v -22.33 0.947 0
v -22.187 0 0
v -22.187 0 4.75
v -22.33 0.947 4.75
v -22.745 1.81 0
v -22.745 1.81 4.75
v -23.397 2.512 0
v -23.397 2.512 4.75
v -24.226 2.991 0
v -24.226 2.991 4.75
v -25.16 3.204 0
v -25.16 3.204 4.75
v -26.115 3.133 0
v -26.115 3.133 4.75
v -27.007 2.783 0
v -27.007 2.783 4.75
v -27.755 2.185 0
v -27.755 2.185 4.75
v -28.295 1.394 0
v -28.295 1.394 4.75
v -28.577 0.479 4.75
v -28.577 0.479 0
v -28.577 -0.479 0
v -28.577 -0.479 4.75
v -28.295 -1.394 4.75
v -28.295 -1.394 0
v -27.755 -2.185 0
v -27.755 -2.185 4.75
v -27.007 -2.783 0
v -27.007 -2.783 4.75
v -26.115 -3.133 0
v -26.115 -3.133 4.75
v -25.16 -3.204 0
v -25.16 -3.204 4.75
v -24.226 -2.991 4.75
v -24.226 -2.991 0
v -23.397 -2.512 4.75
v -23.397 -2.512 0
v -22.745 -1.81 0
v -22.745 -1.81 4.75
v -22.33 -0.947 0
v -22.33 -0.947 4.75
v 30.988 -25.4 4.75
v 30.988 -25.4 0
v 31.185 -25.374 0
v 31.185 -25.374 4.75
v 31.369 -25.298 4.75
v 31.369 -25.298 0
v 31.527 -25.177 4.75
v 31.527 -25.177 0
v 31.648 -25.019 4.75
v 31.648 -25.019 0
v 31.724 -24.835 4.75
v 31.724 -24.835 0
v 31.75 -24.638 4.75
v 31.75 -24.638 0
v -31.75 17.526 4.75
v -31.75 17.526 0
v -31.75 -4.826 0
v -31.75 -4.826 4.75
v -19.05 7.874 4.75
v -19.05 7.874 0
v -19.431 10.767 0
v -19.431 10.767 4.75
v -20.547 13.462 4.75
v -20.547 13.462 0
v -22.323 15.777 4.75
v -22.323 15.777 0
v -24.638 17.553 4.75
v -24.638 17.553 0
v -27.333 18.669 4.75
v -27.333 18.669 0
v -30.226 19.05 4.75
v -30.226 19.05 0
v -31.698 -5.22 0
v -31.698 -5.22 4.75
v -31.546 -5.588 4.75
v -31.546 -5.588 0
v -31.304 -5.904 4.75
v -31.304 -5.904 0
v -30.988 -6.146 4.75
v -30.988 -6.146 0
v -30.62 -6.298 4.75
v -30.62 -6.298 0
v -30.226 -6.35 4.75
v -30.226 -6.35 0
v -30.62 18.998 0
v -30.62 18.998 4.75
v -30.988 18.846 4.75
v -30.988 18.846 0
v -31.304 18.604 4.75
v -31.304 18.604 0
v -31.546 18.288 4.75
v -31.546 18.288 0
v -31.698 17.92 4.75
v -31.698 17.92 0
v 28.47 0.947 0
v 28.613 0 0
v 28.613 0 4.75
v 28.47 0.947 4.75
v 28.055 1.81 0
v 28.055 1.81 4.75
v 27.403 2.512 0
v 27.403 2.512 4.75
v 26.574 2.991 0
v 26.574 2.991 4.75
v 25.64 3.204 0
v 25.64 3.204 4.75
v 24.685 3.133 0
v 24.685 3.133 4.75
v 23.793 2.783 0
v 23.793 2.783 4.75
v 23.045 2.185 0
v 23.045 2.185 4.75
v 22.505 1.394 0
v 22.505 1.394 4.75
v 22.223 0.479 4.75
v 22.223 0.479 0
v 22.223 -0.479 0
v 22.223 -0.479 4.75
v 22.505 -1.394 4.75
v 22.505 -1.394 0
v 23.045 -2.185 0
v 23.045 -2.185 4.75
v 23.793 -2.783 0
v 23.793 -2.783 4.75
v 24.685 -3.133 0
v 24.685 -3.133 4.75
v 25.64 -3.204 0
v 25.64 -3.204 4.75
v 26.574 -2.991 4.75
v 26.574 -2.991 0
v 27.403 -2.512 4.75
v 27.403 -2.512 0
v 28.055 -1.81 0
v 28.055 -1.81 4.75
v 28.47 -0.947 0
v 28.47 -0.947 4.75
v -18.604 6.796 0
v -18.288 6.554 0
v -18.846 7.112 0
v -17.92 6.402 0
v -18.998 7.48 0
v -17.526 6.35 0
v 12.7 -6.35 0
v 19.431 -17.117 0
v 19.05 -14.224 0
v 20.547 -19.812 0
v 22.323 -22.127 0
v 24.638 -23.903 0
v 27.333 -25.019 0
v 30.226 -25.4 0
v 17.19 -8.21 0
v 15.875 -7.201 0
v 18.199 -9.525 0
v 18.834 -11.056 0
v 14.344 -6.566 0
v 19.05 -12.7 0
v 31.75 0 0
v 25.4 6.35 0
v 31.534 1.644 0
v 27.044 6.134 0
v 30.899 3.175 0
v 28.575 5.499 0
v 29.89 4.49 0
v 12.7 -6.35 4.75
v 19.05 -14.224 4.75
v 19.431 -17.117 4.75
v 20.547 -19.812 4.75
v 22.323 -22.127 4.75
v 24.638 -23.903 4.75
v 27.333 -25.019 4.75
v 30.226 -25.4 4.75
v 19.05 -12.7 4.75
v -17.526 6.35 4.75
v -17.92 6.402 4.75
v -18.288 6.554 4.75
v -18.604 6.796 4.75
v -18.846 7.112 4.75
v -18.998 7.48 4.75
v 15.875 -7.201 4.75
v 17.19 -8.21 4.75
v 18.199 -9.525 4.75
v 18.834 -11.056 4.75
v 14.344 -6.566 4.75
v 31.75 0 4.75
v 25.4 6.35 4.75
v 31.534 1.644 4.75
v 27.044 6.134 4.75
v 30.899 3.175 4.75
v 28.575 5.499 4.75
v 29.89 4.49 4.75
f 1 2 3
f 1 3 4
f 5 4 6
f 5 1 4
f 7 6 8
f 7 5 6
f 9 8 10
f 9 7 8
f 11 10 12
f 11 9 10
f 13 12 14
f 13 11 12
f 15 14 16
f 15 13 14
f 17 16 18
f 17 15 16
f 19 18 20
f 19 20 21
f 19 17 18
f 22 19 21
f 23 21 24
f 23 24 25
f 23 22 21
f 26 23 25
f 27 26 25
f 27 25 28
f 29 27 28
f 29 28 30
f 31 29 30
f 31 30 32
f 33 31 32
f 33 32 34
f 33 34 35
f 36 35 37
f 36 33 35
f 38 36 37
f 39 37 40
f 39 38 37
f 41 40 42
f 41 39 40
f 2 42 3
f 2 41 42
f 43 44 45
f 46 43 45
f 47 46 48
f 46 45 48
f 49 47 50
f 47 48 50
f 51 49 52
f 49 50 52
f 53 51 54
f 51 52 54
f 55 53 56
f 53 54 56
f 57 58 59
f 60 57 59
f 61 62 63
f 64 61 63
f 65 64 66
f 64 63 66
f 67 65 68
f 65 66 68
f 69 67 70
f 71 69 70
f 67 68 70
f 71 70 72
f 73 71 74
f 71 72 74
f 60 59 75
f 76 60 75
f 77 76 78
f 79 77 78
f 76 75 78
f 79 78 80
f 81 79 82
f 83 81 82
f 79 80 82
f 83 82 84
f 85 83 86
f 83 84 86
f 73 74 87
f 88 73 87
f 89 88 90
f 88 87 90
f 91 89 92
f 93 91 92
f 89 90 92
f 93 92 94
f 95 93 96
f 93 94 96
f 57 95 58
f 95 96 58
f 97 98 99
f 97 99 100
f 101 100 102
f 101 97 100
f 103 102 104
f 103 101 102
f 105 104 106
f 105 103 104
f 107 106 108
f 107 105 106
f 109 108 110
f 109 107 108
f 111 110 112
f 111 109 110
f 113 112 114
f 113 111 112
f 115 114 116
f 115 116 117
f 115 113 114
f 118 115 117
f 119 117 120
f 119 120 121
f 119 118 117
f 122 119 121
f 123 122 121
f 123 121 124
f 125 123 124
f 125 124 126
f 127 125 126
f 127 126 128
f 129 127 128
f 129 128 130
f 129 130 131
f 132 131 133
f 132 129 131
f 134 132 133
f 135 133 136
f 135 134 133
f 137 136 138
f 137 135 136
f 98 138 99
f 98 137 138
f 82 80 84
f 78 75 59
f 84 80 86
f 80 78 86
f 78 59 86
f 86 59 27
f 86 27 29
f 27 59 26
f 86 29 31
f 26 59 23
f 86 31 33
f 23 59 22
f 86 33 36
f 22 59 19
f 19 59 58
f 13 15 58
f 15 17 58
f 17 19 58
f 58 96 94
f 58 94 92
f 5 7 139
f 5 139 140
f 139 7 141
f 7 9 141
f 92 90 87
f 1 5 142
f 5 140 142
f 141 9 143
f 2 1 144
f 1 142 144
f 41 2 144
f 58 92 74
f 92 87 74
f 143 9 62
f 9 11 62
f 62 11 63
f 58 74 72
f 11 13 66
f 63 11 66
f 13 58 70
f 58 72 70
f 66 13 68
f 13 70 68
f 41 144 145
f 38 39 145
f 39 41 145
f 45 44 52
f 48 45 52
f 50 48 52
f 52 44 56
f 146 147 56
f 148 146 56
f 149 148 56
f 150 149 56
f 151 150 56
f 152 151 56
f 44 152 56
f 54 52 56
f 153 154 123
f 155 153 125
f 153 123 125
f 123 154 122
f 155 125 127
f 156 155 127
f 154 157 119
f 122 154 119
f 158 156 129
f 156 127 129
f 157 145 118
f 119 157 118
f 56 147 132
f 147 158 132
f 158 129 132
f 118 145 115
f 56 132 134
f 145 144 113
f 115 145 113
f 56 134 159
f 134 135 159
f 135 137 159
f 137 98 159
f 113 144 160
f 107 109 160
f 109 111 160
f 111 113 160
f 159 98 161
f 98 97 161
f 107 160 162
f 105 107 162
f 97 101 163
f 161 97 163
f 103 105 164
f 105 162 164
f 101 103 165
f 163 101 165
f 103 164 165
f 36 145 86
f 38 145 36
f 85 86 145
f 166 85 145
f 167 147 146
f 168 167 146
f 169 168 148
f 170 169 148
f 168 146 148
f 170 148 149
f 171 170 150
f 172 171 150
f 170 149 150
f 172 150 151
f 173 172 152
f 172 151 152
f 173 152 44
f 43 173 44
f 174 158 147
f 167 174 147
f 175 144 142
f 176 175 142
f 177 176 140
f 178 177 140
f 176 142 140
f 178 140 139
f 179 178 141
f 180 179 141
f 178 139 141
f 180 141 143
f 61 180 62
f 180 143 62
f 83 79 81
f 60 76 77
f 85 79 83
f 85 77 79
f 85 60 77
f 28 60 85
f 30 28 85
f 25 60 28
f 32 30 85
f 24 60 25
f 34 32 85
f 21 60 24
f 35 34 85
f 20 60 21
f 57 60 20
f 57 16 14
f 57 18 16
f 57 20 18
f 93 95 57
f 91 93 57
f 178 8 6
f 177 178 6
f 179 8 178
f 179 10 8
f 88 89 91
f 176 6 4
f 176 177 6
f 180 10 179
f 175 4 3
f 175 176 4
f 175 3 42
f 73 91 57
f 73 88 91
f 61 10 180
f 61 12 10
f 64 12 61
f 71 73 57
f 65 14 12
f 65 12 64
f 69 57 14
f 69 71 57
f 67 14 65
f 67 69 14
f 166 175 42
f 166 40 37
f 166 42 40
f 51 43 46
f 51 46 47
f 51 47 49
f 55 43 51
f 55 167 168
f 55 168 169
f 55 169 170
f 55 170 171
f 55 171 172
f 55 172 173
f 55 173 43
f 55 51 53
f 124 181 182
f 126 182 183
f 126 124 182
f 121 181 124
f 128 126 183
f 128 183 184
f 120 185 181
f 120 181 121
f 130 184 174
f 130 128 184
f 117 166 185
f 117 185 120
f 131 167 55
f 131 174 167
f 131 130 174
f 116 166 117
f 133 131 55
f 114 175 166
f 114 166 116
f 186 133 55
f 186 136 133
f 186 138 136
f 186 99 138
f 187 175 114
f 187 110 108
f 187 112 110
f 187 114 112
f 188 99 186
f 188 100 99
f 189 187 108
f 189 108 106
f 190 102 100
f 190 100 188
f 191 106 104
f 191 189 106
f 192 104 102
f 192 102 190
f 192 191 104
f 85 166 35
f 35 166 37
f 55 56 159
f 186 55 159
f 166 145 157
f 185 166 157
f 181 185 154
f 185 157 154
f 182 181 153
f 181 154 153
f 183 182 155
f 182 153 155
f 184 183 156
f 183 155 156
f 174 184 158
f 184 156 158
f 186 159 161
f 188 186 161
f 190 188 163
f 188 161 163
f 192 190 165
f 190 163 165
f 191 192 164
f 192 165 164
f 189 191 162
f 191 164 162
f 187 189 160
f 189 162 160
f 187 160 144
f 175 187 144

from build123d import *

# Parameters (mm, degrees)
F0_R     = 3.2131
F1_DEPTH = 4.7498


with BuildPart() as f1:
    # F0 (on Top) → F1 (new body)
    with BuildSketch(Plane.XY):
        with BuildLine():
            ThreePointArc((-30.226, 19.05), (-31.303631, 18.603631), (-31.75, 17.526))
            Line((-31.75, 17.526), (-31.75, -4.826))
            ThreePointArc((-31.75, -4.826), (-31.303631, -5.903631), (-30.226, -6.35))
            Line((-30.226, -6.35), (12.7, -6.35))
            ThreePointArc((12.7, -6.35), (17.190128, -8.209872), (19.05, -12.7))
            Line((19.05, -12.7), (19.05, -14.224))
            ThreePointArc((19.05, -14.224), (22.323375, -22.126625), (30.226, -25.4))
            Line((30.226, -25.4), (30.988, -25.4))
            ThreePointArc((30.988, -25.4), (31.526815, -25.176815), (31.75, -24.638))
            Line((31.75, -24.638), (31.75, 0))
            ThreePointArc((31.75, 0), (29.890128, 4.490128), (25.4, 6.35))
            Line((25.4, 6.35), (-17.526, 6.35))
            ThreePointArc((-17.526, 6.35), (-18.603631, 6.796369), (-19.05, 7.874))
            ThreePointArc((-19.05, 7.874), (-22.323375, 15.776625), (-30.226, 19.05))
        make_face()
        with Locations((-25.4, 0)):
            Circle(F0_R, mode=Mode.SUBTRACT)
        with Locations((25.4, 0)):
            Circle(F0_R, mode=Mode.SUBTRACT)
    extrude(amount=F1_DEPTH)


solid = f1.part
